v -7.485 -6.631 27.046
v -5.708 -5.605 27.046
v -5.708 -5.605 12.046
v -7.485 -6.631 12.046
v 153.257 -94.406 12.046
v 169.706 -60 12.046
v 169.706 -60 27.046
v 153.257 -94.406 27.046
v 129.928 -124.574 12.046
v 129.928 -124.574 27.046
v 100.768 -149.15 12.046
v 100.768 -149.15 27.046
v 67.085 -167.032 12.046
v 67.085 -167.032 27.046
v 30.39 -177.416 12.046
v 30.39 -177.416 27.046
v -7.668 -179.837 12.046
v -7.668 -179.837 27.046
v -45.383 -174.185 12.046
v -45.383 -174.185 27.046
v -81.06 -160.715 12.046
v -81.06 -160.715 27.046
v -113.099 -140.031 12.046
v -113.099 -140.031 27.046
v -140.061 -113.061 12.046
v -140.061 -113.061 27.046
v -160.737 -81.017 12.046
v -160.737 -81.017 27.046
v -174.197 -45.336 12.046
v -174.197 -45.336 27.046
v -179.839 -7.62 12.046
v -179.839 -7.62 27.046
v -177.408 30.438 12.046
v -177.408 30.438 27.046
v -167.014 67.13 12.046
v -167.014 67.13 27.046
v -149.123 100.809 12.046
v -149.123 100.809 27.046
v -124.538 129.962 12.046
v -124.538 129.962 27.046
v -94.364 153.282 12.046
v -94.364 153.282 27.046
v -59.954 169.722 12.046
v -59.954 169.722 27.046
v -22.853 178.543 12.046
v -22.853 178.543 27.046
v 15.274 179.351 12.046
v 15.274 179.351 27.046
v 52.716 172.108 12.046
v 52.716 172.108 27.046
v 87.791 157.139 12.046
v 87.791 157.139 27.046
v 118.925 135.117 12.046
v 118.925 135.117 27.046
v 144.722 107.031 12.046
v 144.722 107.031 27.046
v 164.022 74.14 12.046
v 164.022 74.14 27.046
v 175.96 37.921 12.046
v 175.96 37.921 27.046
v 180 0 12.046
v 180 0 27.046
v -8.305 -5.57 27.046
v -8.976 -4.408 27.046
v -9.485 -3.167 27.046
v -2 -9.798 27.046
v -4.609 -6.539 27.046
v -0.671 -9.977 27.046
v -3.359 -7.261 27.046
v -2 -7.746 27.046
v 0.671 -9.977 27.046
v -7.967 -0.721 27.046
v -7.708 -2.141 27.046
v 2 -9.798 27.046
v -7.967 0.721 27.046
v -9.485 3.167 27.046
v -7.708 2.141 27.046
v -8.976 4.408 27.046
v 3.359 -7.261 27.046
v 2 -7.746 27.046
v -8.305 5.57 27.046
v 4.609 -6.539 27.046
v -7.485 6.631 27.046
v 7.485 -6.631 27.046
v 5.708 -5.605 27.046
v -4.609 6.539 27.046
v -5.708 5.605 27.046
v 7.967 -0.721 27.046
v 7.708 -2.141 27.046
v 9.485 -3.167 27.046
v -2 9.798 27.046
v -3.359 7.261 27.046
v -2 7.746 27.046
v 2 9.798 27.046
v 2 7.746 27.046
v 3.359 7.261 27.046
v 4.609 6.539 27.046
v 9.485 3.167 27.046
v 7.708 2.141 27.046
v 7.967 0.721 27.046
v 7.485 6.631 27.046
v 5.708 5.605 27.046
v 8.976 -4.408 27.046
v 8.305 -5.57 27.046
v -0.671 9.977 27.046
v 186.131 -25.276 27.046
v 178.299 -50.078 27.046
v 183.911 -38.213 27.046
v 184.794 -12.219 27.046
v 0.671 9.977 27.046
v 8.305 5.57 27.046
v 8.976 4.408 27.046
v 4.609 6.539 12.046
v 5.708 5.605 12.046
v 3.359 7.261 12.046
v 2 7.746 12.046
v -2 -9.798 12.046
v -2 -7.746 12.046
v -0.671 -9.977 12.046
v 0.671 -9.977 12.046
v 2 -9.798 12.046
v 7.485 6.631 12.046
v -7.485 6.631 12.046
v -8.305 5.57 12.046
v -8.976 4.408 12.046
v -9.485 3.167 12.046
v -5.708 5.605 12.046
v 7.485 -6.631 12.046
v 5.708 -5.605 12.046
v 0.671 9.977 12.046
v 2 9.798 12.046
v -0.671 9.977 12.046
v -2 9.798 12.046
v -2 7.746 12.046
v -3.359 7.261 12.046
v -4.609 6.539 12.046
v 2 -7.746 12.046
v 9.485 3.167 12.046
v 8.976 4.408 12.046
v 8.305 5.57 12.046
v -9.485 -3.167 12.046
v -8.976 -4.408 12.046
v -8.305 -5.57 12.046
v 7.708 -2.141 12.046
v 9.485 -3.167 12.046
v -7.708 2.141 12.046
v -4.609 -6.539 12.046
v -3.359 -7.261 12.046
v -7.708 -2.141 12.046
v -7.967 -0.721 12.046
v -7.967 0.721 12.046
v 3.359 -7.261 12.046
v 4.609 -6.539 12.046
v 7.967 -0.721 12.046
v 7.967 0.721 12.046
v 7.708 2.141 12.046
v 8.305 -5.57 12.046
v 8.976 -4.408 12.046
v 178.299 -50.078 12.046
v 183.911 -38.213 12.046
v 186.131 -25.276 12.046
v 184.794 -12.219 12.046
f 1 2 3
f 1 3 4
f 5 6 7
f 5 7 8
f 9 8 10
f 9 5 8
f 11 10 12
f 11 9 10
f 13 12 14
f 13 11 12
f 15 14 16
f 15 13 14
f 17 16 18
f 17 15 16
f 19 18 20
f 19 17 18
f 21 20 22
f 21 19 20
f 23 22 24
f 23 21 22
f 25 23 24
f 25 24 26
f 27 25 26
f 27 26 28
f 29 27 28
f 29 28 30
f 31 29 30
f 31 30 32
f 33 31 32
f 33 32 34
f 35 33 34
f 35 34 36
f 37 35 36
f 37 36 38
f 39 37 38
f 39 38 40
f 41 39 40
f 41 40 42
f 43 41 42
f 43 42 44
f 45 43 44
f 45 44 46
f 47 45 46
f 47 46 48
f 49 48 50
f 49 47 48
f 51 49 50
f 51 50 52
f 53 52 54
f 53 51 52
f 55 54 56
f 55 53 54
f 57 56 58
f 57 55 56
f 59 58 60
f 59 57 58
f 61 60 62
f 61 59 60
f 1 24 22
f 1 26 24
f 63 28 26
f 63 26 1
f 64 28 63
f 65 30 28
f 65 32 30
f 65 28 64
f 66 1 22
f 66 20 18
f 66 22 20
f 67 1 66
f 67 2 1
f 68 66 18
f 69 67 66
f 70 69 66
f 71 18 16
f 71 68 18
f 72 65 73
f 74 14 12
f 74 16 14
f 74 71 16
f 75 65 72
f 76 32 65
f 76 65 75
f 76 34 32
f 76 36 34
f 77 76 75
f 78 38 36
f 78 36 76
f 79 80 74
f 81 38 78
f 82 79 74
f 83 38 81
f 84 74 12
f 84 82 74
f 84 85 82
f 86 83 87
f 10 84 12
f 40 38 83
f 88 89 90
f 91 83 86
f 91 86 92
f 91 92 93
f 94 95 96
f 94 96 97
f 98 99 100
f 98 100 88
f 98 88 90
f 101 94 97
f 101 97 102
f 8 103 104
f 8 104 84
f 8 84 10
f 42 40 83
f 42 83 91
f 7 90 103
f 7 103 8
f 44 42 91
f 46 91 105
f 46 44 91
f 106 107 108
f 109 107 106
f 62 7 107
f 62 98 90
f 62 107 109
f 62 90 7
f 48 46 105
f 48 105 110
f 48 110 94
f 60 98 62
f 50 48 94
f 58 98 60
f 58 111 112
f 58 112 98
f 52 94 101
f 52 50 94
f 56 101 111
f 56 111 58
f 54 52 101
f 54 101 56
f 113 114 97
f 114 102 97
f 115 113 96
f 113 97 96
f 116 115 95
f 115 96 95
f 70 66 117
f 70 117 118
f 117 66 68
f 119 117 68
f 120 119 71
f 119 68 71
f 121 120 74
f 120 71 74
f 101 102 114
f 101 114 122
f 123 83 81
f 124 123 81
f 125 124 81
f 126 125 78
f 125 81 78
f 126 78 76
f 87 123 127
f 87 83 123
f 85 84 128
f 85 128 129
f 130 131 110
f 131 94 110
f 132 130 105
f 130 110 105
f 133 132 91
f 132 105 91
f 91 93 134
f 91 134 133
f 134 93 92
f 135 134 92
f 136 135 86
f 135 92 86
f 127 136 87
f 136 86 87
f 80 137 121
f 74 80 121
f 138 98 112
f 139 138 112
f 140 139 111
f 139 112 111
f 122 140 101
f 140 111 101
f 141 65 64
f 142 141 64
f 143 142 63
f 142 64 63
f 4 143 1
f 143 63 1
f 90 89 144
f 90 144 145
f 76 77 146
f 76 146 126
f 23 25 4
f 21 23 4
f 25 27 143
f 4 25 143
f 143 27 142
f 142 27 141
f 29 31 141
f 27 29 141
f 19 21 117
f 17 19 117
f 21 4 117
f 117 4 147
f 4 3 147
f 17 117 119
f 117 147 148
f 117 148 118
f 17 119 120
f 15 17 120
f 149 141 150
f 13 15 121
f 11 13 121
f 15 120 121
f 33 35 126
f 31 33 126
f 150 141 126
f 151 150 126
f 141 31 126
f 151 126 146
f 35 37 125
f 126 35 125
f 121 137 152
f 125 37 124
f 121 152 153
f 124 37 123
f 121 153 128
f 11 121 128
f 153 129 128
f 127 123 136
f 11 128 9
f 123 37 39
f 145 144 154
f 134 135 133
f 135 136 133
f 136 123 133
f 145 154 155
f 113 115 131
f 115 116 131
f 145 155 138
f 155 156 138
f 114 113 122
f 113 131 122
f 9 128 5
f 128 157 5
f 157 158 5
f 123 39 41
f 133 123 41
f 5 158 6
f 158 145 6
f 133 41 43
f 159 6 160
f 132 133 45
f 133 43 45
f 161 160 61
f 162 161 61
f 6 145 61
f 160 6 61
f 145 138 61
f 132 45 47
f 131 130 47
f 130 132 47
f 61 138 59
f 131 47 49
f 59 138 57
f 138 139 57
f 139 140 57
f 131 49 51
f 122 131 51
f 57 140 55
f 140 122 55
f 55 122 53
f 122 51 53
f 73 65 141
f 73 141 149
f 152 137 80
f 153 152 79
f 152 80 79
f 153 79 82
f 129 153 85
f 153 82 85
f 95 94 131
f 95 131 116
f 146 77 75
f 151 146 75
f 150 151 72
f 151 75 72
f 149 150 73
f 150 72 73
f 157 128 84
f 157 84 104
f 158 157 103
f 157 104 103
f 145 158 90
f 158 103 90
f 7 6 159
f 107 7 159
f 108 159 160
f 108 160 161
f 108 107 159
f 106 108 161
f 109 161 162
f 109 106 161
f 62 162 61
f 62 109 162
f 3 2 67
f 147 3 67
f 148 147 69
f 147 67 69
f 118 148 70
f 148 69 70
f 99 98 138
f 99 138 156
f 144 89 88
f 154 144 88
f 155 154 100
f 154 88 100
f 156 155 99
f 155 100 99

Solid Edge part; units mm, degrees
sketch "Sketch1" plane through (0, 0, 12.0462) normal (0, 0, 1) x (1, 0, 0)
  circle A0 centre (0, 0) radius 180
extrude "ProtrusioneEstrusa_1" add sketch "Sketch1" along normal blind 15
sketch "Sketch2" plane through (0, 0, 27.0462) normal (0, 0, 1) x (0, 1, 0)
  arc A0 (6.631, -7.4853) -> (3.1669, -9.4853) centre (0, 0) cw
  line L0 (3.1669, -9.4853) -> (2.1409, -7.7082)
  arc A1 (2.1409, -7.7082) -> (-2.1409, -7.7082) centre (0, 0) cw
  line L1 (-2.1409, -7.7082) -> (-3.1669, -9.4853)
  arc A2 (-3.1669, -9.4853) -> (-6.631, -7.4853) centre (0, 0) cw
  line L2 (-6.631, -7.4853) -> (-5.605, -5.7082)
  arc A3 (-5.605, -5.7082) -> (-7.746, -2) centre (0, 0) cw
  line L3 (-7.746, -2) -> (-9.798, -2)
  arc A4 (-9.798, -2) -> (-9.798, 2) centre (0, 0) cw
  line L4 (-9.798, 2) -> (-7.746, 2)
  arc A5 (-7.746, 2) -> (-5.605, 5.7082) centre (0, 0) cw
  line L5 (-5.605, 5.7082) -> (-6.631, 7.4853)
  arc A6 (-6.631, 7.4853) -> (-3.1669, 9.4853) centre (0, 0) cw
  line L6 (-3.1669, 9.4853) -> (-2.1409, 7.7082)
  arc A7 (-2.1409, 7.7082) -> (2.1409, 7.7082) centre (0, 0) cw
  line L7 (2.1409, 7.7082) -> (3.1669, 9.4853)
  arc A8 (3.1669, 9.4853) -> (6.631, 7.4853) centre (0, 0) cw
  line L8 (6.631, 7.4853) -> (5.605, 5.7082)
  arc A9 (5.605, 5.7082) -> (7.746, 2) centre (0, 0) cw
  line L9 (7.746, 2) -> (9.798, 2)
  arc A10 (9.798, 2) -> (9.798, -2) centre (0, 0) cw
  line L10 (9.798, -2) -> (7.746, -2)
  arc A11 (7.746, -2) -> (5.605, -5.7082) centre (0, 0) cw
  line L11 (5.605, -5.7082) -> (6.631, -7.4853)
extrude "Cutout1" cut sketch "Sketch2" against normal through all
sketch "Sketch3" plane through (0, 0, 27.0462) normal (0, 0, 1) x (-1, 0, 0)
  arc A0 (-169.7056, 60) -> (-180, 0) centre (-137.739, 23.6323) ccw
extrude "Protrusion1" add sketch "Sketch3" against normal up to vertex (15 mm away) material side at (185.4122, -31.8117, 27.0462)
properties material "Policarbonato"
